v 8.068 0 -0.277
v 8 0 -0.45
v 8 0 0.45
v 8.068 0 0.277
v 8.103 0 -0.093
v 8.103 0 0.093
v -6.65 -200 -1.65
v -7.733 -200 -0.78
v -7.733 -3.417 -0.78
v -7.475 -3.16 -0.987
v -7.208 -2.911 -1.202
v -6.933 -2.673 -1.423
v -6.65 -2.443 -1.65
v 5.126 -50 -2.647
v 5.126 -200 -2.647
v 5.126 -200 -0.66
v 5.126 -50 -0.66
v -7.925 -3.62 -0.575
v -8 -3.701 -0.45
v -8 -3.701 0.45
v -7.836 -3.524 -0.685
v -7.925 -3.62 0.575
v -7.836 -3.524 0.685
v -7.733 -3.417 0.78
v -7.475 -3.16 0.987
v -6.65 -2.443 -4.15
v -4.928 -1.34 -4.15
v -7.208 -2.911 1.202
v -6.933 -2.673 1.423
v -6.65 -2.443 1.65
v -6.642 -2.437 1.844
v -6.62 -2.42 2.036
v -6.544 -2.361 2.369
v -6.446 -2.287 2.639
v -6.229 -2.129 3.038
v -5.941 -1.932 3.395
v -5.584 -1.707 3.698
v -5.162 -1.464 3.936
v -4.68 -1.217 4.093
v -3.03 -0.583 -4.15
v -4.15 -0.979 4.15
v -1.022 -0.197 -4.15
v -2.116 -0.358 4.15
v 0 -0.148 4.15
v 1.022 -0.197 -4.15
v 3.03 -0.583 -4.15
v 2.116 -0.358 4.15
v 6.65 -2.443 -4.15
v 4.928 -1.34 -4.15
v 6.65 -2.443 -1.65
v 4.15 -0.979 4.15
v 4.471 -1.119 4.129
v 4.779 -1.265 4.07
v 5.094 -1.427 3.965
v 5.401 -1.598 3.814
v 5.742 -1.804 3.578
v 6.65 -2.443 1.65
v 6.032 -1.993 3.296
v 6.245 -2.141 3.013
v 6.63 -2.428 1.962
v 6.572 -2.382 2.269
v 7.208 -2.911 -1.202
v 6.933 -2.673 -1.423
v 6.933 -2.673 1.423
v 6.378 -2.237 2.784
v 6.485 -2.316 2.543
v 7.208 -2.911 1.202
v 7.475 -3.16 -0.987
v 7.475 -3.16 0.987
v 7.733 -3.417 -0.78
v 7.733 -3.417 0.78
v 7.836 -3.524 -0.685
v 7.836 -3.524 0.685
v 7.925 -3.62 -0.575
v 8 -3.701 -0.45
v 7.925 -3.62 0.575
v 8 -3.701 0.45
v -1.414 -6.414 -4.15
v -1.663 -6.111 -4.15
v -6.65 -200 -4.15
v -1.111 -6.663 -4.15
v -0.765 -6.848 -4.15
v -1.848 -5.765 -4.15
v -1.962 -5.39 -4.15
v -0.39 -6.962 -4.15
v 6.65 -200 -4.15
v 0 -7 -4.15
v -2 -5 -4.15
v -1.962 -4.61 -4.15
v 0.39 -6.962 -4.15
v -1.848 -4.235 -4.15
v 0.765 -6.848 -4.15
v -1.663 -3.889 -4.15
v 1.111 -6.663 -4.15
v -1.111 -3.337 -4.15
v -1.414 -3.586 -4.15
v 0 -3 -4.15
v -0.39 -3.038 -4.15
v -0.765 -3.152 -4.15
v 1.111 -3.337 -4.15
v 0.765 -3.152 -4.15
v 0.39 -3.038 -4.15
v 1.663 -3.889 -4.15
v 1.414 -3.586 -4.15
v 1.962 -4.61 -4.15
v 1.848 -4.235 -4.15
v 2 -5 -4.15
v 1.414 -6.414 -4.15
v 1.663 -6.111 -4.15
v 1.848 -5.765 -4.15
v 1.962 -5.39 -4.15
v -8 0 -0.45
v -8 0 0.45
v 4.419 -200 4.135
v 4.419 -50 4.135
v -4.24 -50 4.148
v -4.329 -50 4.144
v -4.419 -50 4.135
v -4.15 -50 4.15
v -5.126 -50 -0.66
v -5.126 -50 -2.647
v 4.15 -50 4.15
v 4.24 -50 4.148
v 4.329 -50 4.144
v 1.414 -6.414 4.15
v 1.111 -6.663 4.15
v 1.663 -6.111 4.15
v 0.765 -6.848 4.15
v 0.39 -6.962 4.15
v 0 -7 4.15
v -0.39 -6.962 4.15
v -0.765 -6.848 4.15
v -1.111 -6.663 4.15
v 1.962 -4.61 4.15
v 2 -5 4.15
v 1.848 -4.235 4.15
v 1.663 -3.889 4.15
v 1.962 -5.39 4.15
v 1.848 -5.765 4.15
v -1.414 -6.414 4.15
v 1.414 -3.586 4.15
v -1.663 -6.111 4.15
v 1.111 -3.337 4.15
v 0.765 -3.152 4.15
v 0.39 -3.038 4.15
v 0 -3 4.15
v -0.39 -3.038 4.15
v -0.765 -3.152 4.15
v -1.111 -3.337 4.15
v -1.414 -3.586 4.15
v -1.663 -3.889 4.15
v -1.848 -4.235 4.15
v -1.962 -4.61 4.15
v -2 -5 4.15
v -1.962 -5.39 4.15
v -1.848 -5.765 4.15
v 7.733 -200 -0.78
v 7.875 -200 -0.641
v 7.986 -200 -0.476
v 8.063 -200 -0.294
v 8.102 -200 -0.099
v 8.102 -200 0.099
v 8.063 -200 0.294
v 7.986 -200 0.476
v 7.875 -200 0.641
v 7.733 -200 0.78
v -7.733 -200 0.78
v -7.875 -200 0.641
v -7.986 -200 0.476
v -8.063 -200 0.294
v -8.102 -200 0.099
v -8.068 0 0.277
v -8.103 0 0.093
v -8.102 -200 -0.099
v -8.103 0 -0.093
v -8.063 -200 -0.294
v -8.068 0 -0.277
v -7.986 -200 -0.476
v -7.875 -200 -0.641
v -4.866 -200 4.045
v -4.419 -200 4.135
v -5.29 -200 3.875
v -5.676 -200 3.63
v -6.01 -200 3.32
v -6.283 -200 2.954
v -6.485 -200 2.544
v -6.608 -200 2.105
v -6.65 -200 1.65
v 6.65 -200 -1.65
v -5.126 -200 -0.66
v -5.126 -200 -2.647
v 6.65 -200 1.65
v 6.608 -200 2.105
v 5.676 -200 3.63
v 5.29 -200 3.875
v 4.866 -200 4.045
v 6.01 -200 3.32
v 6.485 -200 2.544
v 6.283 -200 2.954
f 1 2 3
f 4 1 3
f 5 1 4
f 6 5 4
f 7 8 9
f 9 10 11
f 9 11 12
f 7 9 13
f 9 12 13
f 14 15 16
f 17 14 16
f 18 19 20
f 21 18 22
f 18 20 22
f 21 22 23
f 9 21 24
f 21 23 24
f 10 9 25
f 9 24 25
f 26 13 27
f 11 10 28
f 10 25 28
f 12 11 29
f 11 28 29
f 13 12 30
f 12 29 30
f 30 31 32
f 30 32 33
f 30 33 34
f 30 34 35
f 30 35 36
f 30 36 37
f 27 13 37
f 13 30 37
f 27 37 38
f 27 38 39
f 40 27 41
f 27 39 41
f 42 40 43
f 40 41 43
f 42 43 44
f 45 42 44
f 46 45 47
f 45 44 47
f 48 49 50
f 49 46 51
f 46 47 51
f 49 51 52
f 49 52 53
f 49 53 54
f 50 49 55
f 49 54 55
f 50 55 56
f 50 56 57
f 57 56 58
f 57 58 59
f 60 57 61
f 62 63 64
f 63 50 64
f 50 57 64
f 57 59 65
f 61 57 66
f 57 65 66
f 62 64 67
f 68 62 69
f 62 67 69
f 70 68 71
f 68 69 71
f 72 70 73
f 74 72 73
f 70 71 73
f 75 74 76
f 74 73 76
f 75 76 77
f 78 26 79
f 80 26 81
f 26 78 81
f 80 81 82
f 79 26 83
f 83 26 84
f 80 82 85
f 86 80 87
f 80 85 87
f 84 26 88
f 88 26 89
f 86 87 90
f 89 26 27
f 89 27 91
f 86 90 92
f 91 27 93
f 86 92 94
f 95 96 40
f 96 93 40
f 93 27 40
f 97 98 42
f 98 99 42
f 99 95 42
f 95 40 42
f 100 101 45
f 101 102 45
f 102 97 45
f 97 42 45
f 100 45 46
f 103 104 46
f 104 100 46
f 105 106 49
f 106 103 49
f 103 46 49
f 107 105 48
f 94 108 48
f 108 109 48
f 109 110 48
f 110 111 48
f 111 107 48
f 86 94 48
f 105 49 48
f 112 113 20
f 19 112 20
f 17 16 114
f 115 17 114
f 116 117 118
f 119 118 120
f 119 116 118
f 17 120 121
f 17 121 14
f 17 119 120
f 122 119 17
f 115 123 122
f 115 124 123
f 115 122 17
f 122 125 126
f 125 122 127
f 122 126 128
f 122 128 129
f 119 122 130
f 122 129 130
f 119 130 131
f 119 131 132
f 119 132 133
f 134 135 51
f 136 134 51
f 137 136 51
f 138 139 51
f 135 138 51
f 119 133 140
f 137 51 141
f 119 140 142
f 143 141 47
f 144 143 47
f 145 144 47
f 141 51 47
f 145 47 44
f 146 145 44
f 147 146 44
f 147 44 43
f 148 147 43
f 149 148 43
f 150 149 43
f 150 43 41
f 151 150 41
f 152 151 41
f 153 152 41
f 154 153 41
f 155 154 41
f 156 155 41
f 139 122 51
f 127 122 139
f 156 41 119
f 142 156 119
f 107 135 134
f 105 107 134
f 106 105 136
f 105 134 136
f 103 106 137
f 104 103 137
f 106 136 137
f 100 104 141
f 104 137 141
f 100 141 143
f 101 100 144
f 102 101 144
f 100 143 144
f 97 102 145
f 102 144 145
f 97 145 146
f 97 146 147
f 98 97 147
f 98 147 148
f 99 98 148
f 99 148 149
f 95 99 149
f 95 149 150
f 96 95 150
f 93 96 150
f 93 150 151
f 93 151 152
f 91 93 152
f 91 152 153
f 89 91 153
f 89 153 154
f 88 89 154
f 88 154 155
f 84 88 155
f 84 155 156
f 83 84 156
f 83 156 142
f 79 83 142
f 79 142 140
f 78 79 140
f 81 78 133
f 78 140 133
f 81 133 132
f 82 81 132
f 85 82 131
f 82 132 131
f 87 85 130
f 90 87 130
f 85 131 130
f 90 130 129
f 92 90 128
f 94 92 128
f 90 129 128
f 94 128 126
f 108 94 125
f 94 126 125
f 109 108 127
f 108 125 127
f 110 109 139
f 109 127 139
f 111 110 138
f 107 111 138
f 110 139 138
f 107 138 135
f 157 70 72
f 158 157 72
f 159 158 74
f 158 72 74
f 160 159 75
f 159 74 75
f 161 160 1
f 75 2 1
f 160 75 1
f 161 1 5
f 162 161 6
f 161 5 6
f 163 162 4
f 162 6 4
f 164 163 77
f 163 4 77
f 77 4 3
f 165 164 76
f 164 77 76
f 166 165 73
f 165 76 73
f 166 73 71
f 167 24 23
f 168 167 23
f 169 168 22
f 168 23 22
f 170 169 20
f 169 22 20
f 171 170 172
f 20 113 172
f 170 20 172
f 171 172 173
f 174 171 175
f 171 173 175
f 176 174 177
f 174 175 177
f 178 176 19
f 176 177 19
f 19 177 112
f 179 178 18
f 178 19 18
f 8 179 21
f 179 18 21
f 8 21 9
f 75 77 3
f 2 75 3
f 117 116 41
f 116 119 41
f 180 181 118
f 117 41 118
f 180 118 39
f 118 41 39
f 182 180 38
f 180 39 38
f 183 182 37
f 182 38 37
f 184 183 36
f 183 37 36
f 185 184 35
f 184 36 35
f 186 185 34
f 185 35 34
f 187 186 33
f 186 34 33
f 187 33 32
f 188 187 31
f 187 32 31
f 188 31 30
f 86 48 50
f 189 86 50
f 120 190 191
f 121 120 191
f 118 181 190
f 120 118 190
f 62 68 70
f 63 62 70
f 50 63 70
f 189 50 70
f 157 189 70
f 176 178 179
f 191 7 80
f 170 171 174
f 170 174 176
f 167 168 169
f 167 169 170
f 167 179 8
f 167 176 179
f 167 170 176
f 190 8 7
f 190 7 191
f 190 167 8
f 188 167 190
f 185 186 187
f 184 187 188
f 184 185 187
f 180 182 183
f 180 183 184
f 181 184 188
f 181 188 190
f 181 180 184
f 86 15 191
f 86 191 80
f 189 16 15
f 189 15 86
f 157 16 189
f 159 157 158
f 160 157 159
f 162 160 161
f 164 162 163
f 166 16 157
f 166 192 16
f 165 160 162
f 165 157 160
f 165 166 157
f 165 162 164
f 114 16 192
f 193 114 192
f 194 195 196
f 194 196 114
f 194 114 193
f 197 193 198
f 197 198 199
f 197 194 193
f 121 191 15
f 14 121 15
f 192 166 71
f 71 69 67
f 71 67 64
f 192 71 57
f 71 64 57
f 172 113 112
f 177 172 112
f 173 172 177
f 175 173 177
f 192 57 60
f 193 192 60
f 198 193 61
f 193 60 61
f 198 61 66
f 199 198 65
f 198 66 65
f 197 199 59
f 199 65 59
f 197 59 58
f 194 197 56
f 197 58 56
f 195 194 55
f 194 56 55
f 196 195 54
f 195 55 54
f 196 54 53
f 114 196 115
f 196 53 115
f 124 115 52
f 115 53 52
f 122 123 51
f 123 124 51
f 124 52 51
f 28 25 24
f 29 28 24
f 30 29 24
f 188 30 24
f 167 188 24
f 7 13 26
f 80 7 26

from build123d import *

# Parameters (mm, degrees)
F1_DEPTH = 200
F2_R     = 2
F3_DEPTH = 8.301
F6_DEPTH = 25
F9_DEPTH = 150


# Not quite as in the source:
# - a feature names something its author has since deleted; it is built from what else it names


with BuildPart() as f1:
    # F0 (on Front) → F1 (new body)
    with BuildSketch(Plane.XZ):
        with BuildLine():
            Line((7.7333916469, 0.7795584959), (6.65, 1.65))
            ThreePointArc((6.65, 1.65), (5.917766953, 3.417766953), (4.15, 4.15))
            Line((4.15, 4.15), (-4.15, 4.15))
            ThreePointArc((-4.15, 4.15), (-5.917766953, 3.417766953), (-6.65, 1.65))
            Line((-6.65, 1.65), (-7.7333916469, 0.7795584959))
            ThreePointArc((-7.7333916469, 0.7795584959), (-8.1070622196, 0), (-7.7333916469, -0.7795584959))
            Line((-7.7333916469, -0.7795584959), (-6.65, -1.65))
            Line((-6.65, -1.65), (-6.65, -4.15))
            Line((-6.65, -4.15), (-4.15, -4.15))
            Line((-4.15, -4.15), (4.15, -4.15))
            Line((4.15, -4.15), (6.65, -4.15))
            Line((6.65, -4.15), (6.65, -1.65))
            Line((6.65, -1.65), (7.7333916469, -0.7795584959))
            ThreePointArc((7.7333916469, -0.7795584959), (8.1070622196, 0), (7.7333916469, 0.7795584959))
        make_face()
        with BuildLine():
            ThreePointArc((5.15, -1.65), (4.8571067812, -2.3571067812), (4.15, -2.65))
            Line((4.15, -2.65), (-4.15, -2.65))
            ThreePointArc((-4.15, -2.65), (-4.8571067812, -2.3571067812), (-5.15, -1.65))
            Line((-5.15, -1.65), (-5.15, 1.65))
            ThreePointArc((-5.15, 1.65), (-4.8571067812, 2.3571067812), (-4.15, 2.65))
            Line((-4.15, 2.65), (4.15, 2.65))
            ThreePointArc((4.15, 2.65), (4.8571067812, 2.3571067812), (5.15, 1.65))
            Line((5.15, 1.65), (5.15, -1.65))
        make_face(mode=Mode.SUBTRACT)
        with BuildLine():
            Line((-4.15, -2.65), (4.15, -2.65))
            ThreePointArc((4.15, -2.65), (4.8571067812, -2.3571067812), (5.15, -1.65))
            Line((5.15, -1.65), (5.15, 1.65))
            ThreePointArc((5.15, 1.65), (4.8571067812, 2.3571067812), (4.15, 2.65))
            Line((4.15, 2.65), (-4.15, 2.65))
            ThreePointArc((-4.15, 2.65), (-4.8571067812, 2.3571067812), (-5.15, 1.65))
            Line((-5.15, 1.65), (-5.15, -1.65))
            ThreePointArc((-5.15, -1.65), (-4.8571067812, -2.3571067812), (-4.15, -2.65))
        make_face()
    extrude(amount=F1_DEPTH)

    # F2 (on face) → F3 (cut, through all)
    with BuildSketch(Plane.XY.offset(4.15)):
        with Locations((0, -5)):
            Circle(F2_R)
    extrude(amount=-F3_DEPTH, mode=Mode.SUBTRACT)

    # F5 (on offset) → F6 (cut)
    with BuildSketch(Plane.XY.offset(4.6)):
        with BuildLine():
            Line((8, -3.7011680724), (8, 3.7011680724))
            Line((8, 3.7011680724), (-8, 3.7011680724))
            Line((-8, 3.7011680724), (-8, -3.7011680724))
            ThreePointArc((-8, -3.7011680724), (0, -0.1482238292), (8, -3.7011680724))
        make_face()
    extrude(amount=-F6_DEPTH, mode=Mode.SUBTRACT)

    # F8 (on offset) → F9 (cut)
    with BuildSketch(Plane.XZ.offset(200)):
        Polygon((-5.1262229681, -2.646596171), (0, -2.646596171), (5.1262229681, -2.646596171), (5.1262229681, -0.6600963534), (4.3867812492, 4.353403829), (0, 4.353403829), (-4.3867812492, 4.353403829), (-5.1262229681, -0.6600963534), align=None)
    extrude(amount=-F9_DEPTH, mode=Mode.SUBTRACT)


solid = f1.part
